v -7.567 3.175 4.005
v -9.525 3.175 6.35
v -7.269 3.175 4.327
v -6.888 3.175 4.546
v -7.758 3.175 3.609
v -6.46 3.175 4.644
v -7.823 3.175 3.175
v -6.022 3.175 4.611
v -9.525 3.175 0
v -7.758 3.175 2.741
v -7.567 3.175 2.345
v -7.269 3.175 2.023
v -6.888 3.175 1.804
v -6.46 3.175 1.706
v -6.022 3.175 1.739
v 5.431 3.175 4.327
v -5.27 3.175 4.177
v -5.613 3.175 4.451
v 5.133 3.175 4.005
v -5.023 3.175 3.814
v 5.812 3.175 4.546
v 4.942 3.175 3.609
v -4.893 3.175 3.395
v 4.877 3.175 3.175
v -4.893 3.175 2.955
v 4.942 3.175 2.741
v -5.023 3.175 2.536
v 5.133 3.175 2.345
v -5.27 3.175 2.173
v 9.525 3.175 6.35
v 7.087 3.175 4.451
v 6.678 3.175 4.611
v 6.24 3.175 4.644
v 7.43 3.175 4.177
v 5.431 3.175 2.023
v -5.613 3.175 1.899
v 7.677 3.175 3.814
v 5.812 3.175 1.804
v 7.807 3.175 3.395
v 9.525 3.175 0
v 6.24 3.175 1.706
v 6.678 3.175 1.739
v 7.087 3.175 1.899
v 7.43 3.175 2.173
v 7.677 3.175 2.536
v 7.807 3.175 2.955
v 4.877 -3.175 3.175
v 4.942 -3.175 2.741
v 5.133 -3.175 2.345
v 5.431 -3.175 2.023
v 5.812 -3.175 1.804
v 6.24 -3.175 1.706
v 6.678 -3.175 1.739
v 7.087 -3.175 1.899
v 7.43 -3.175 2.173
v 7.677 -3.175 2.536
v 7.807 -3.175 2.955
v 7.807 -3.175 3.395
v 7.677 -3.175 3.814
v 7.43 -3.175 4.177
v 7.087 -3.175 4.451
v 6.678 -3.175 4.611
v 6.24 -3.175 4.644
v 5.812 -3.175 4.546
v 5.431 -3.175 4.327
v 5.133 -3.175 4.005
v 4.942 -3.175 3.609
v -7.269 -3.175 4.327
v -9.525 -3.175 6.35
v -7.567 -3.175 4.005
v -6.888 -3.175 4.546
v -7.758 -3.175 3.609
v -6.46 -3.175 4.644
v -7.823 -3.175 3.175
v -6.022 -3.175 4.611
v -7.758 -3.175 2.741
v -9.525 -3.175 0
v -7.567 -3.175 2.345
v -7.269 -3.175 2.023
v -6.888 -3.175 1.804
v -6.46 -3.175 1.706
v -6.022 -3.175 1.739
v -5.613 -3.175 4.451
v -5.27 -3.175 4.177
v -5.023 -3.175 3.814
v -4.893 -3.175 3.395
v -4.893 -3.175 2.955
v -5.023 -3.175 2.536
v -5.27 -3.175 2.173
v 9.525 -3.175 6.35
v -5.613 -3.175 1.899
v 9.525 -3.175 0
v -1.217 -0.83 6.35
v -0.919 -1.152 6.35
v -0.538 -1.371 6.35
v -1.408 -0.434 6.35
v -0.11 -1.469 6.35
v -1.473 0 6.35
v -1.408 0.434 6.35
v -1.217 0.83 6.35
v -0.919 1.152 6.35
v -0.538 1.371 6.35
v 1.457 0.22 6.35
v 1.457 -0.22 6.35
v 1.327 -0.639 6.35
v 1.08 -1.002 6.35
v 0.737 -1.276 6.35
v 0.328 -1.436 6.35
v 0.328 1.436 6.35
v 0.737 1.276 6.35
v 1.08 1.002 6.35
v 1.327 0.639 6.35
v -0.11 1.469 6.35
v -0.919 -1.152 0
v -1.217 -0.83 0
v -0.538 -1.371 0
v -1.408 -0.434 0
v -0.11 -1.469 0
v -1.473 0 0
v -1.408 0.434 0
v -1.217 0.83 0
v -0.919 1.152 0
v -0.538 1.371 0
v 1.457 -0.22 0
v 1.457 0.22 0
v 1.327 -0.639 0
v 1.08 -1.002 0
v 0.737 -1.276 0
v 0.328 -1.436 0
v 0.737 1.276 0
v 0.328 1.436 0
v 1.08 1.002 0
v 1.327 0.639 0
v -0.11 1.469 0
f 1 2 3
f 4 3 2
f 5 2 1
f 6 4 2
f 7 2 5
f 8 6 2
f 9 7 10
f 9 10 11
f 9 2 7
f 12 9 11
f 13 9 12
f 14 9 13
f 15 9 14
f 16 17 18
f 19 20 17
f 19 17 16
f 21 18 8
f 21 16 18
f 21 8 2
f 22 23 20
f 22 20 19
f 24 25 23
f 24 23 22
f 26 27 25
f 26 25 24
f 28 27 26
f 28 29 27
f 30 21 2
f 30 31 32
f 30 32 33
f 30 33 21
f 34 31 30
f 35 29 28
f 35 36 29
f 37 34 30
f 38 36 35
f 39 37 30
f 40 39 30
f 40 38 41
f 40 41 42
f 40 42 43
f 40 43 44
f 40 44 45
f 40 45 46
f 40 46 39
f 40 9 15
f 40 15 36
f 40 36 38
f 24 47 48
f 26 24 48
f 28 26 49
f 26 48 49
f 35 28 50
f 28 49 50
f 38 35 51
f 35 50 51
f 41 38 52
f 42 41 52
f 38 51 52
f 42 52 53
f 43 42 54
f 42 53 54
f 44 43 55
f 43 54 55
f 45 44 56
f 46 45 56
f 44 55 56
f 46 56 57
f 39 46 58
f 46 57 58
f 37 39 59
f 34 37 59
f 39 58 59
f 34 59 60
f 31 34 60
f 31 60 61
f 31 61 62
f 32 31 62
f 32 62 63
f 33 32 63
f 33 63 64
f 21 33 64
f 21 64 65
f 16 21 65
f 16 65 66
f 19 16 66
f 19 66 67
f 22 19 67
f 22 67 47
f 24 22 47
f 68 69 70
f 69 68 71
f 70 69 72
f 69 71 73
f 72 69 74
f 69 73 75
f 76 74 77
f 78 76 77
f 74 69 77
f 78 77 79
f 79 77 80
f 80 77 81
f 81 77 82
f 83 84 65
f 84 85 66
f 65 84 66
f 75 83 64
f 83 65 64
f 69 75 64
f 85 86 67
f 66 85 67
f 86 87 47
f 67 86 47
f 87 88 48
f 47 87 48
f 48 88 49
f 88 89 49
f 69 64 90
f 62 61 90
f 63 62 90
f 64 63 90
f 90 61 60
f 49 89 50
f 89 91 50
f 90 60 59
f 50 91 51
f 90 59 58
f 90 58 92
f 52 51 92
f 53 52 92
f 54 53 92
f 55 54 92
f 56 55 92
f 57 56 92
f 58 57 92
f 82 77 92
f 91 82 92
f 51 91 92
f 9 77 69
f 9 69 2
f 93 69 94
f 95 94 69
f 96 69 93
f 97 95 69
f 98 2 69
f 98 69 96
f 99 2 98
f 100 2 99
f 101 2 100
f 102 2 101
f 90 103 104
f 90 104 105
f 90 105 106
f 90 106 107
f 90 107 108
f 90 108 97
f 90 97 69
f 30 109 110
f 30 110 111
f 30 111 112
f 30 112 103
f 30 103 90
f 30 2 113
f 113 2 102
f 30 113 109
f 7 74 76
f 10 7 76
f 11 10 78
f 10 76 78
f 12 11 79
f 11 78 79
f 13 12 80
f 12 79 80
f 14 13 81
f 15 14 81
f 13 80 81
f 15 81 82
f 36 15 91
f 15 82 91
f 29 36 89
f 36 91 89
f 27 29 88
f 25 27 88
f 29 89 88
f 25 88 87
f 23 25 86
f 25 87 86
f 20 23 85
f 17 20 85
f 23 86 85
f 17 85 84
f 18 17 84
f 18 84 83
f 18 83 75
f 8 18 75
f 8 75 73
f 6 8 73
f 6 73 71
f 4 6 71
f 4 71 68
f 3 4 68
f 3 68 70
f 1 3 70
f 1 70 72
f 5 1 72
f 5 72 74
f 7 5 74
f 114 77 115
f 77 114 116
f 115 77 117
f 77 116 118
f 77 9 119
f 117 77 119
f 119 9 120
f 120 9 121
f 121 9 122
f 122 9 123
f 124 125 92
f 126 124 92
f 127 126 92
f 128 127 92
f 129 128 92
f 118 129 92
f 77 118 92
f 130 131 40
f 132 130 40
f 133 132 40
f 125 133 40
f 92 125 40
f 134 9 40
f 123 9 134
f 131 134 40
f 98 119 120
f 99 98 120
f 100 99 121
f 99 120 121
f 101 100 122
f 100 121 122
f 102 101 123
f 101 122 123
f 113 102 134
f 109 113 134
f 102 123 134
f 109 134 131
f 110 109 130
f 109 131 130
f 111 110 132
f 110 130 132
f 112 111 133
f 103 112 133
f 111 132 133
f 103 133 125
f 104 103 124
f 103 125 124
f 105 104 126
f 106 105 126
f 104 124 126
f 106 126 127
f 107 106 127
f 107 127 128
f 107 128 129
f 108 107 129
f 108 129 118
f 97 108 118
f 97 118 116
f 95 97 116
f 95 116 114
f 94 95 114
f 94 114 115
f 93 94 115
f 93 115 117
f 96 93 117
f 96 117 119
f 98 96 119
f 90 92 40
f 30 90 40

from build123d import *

# Parameters (mm, degrees)
SKETCH1_W             = 19.05
SKETCH1_H             = 6.35
BOSS_EXTRUDE1_DEPTH   = 6.35
F_4_CLEARANCE_HOLE1_D = 2.9464
F_4_CLEARANCE_HOLE2_D = 2.9464


with BuildPart() as part:
    # Sketch1 → Boss-Extrude1 (new body)
    with BuildSketch(Plane.XY):
        Rectangle(SKETCH1_W, SKETCH1_H)
    extrude(amount=BOSS_EXTRUDE1_DEPTH)

    # #4 Clearance Hole1 (through all)
    with Locations(Plane(origin=(0, 3.175, 0), x_dir=(1, 0, 0), z_dir=(0, 1, 0))):
        with Locations((-6.35, -3.175), (6.35, -3.175)):
            Hole(F_4_CLEARANCE_HOLE1_D / 2)

    # #4 Clearance Hole2 (through all)
    with Locations(Plane.XY.offset(6.35)):
        with Locations((0, 0)):
            Hole(F_4_CLEARANCE_HOLE2_D / 2)


solid = part.part
